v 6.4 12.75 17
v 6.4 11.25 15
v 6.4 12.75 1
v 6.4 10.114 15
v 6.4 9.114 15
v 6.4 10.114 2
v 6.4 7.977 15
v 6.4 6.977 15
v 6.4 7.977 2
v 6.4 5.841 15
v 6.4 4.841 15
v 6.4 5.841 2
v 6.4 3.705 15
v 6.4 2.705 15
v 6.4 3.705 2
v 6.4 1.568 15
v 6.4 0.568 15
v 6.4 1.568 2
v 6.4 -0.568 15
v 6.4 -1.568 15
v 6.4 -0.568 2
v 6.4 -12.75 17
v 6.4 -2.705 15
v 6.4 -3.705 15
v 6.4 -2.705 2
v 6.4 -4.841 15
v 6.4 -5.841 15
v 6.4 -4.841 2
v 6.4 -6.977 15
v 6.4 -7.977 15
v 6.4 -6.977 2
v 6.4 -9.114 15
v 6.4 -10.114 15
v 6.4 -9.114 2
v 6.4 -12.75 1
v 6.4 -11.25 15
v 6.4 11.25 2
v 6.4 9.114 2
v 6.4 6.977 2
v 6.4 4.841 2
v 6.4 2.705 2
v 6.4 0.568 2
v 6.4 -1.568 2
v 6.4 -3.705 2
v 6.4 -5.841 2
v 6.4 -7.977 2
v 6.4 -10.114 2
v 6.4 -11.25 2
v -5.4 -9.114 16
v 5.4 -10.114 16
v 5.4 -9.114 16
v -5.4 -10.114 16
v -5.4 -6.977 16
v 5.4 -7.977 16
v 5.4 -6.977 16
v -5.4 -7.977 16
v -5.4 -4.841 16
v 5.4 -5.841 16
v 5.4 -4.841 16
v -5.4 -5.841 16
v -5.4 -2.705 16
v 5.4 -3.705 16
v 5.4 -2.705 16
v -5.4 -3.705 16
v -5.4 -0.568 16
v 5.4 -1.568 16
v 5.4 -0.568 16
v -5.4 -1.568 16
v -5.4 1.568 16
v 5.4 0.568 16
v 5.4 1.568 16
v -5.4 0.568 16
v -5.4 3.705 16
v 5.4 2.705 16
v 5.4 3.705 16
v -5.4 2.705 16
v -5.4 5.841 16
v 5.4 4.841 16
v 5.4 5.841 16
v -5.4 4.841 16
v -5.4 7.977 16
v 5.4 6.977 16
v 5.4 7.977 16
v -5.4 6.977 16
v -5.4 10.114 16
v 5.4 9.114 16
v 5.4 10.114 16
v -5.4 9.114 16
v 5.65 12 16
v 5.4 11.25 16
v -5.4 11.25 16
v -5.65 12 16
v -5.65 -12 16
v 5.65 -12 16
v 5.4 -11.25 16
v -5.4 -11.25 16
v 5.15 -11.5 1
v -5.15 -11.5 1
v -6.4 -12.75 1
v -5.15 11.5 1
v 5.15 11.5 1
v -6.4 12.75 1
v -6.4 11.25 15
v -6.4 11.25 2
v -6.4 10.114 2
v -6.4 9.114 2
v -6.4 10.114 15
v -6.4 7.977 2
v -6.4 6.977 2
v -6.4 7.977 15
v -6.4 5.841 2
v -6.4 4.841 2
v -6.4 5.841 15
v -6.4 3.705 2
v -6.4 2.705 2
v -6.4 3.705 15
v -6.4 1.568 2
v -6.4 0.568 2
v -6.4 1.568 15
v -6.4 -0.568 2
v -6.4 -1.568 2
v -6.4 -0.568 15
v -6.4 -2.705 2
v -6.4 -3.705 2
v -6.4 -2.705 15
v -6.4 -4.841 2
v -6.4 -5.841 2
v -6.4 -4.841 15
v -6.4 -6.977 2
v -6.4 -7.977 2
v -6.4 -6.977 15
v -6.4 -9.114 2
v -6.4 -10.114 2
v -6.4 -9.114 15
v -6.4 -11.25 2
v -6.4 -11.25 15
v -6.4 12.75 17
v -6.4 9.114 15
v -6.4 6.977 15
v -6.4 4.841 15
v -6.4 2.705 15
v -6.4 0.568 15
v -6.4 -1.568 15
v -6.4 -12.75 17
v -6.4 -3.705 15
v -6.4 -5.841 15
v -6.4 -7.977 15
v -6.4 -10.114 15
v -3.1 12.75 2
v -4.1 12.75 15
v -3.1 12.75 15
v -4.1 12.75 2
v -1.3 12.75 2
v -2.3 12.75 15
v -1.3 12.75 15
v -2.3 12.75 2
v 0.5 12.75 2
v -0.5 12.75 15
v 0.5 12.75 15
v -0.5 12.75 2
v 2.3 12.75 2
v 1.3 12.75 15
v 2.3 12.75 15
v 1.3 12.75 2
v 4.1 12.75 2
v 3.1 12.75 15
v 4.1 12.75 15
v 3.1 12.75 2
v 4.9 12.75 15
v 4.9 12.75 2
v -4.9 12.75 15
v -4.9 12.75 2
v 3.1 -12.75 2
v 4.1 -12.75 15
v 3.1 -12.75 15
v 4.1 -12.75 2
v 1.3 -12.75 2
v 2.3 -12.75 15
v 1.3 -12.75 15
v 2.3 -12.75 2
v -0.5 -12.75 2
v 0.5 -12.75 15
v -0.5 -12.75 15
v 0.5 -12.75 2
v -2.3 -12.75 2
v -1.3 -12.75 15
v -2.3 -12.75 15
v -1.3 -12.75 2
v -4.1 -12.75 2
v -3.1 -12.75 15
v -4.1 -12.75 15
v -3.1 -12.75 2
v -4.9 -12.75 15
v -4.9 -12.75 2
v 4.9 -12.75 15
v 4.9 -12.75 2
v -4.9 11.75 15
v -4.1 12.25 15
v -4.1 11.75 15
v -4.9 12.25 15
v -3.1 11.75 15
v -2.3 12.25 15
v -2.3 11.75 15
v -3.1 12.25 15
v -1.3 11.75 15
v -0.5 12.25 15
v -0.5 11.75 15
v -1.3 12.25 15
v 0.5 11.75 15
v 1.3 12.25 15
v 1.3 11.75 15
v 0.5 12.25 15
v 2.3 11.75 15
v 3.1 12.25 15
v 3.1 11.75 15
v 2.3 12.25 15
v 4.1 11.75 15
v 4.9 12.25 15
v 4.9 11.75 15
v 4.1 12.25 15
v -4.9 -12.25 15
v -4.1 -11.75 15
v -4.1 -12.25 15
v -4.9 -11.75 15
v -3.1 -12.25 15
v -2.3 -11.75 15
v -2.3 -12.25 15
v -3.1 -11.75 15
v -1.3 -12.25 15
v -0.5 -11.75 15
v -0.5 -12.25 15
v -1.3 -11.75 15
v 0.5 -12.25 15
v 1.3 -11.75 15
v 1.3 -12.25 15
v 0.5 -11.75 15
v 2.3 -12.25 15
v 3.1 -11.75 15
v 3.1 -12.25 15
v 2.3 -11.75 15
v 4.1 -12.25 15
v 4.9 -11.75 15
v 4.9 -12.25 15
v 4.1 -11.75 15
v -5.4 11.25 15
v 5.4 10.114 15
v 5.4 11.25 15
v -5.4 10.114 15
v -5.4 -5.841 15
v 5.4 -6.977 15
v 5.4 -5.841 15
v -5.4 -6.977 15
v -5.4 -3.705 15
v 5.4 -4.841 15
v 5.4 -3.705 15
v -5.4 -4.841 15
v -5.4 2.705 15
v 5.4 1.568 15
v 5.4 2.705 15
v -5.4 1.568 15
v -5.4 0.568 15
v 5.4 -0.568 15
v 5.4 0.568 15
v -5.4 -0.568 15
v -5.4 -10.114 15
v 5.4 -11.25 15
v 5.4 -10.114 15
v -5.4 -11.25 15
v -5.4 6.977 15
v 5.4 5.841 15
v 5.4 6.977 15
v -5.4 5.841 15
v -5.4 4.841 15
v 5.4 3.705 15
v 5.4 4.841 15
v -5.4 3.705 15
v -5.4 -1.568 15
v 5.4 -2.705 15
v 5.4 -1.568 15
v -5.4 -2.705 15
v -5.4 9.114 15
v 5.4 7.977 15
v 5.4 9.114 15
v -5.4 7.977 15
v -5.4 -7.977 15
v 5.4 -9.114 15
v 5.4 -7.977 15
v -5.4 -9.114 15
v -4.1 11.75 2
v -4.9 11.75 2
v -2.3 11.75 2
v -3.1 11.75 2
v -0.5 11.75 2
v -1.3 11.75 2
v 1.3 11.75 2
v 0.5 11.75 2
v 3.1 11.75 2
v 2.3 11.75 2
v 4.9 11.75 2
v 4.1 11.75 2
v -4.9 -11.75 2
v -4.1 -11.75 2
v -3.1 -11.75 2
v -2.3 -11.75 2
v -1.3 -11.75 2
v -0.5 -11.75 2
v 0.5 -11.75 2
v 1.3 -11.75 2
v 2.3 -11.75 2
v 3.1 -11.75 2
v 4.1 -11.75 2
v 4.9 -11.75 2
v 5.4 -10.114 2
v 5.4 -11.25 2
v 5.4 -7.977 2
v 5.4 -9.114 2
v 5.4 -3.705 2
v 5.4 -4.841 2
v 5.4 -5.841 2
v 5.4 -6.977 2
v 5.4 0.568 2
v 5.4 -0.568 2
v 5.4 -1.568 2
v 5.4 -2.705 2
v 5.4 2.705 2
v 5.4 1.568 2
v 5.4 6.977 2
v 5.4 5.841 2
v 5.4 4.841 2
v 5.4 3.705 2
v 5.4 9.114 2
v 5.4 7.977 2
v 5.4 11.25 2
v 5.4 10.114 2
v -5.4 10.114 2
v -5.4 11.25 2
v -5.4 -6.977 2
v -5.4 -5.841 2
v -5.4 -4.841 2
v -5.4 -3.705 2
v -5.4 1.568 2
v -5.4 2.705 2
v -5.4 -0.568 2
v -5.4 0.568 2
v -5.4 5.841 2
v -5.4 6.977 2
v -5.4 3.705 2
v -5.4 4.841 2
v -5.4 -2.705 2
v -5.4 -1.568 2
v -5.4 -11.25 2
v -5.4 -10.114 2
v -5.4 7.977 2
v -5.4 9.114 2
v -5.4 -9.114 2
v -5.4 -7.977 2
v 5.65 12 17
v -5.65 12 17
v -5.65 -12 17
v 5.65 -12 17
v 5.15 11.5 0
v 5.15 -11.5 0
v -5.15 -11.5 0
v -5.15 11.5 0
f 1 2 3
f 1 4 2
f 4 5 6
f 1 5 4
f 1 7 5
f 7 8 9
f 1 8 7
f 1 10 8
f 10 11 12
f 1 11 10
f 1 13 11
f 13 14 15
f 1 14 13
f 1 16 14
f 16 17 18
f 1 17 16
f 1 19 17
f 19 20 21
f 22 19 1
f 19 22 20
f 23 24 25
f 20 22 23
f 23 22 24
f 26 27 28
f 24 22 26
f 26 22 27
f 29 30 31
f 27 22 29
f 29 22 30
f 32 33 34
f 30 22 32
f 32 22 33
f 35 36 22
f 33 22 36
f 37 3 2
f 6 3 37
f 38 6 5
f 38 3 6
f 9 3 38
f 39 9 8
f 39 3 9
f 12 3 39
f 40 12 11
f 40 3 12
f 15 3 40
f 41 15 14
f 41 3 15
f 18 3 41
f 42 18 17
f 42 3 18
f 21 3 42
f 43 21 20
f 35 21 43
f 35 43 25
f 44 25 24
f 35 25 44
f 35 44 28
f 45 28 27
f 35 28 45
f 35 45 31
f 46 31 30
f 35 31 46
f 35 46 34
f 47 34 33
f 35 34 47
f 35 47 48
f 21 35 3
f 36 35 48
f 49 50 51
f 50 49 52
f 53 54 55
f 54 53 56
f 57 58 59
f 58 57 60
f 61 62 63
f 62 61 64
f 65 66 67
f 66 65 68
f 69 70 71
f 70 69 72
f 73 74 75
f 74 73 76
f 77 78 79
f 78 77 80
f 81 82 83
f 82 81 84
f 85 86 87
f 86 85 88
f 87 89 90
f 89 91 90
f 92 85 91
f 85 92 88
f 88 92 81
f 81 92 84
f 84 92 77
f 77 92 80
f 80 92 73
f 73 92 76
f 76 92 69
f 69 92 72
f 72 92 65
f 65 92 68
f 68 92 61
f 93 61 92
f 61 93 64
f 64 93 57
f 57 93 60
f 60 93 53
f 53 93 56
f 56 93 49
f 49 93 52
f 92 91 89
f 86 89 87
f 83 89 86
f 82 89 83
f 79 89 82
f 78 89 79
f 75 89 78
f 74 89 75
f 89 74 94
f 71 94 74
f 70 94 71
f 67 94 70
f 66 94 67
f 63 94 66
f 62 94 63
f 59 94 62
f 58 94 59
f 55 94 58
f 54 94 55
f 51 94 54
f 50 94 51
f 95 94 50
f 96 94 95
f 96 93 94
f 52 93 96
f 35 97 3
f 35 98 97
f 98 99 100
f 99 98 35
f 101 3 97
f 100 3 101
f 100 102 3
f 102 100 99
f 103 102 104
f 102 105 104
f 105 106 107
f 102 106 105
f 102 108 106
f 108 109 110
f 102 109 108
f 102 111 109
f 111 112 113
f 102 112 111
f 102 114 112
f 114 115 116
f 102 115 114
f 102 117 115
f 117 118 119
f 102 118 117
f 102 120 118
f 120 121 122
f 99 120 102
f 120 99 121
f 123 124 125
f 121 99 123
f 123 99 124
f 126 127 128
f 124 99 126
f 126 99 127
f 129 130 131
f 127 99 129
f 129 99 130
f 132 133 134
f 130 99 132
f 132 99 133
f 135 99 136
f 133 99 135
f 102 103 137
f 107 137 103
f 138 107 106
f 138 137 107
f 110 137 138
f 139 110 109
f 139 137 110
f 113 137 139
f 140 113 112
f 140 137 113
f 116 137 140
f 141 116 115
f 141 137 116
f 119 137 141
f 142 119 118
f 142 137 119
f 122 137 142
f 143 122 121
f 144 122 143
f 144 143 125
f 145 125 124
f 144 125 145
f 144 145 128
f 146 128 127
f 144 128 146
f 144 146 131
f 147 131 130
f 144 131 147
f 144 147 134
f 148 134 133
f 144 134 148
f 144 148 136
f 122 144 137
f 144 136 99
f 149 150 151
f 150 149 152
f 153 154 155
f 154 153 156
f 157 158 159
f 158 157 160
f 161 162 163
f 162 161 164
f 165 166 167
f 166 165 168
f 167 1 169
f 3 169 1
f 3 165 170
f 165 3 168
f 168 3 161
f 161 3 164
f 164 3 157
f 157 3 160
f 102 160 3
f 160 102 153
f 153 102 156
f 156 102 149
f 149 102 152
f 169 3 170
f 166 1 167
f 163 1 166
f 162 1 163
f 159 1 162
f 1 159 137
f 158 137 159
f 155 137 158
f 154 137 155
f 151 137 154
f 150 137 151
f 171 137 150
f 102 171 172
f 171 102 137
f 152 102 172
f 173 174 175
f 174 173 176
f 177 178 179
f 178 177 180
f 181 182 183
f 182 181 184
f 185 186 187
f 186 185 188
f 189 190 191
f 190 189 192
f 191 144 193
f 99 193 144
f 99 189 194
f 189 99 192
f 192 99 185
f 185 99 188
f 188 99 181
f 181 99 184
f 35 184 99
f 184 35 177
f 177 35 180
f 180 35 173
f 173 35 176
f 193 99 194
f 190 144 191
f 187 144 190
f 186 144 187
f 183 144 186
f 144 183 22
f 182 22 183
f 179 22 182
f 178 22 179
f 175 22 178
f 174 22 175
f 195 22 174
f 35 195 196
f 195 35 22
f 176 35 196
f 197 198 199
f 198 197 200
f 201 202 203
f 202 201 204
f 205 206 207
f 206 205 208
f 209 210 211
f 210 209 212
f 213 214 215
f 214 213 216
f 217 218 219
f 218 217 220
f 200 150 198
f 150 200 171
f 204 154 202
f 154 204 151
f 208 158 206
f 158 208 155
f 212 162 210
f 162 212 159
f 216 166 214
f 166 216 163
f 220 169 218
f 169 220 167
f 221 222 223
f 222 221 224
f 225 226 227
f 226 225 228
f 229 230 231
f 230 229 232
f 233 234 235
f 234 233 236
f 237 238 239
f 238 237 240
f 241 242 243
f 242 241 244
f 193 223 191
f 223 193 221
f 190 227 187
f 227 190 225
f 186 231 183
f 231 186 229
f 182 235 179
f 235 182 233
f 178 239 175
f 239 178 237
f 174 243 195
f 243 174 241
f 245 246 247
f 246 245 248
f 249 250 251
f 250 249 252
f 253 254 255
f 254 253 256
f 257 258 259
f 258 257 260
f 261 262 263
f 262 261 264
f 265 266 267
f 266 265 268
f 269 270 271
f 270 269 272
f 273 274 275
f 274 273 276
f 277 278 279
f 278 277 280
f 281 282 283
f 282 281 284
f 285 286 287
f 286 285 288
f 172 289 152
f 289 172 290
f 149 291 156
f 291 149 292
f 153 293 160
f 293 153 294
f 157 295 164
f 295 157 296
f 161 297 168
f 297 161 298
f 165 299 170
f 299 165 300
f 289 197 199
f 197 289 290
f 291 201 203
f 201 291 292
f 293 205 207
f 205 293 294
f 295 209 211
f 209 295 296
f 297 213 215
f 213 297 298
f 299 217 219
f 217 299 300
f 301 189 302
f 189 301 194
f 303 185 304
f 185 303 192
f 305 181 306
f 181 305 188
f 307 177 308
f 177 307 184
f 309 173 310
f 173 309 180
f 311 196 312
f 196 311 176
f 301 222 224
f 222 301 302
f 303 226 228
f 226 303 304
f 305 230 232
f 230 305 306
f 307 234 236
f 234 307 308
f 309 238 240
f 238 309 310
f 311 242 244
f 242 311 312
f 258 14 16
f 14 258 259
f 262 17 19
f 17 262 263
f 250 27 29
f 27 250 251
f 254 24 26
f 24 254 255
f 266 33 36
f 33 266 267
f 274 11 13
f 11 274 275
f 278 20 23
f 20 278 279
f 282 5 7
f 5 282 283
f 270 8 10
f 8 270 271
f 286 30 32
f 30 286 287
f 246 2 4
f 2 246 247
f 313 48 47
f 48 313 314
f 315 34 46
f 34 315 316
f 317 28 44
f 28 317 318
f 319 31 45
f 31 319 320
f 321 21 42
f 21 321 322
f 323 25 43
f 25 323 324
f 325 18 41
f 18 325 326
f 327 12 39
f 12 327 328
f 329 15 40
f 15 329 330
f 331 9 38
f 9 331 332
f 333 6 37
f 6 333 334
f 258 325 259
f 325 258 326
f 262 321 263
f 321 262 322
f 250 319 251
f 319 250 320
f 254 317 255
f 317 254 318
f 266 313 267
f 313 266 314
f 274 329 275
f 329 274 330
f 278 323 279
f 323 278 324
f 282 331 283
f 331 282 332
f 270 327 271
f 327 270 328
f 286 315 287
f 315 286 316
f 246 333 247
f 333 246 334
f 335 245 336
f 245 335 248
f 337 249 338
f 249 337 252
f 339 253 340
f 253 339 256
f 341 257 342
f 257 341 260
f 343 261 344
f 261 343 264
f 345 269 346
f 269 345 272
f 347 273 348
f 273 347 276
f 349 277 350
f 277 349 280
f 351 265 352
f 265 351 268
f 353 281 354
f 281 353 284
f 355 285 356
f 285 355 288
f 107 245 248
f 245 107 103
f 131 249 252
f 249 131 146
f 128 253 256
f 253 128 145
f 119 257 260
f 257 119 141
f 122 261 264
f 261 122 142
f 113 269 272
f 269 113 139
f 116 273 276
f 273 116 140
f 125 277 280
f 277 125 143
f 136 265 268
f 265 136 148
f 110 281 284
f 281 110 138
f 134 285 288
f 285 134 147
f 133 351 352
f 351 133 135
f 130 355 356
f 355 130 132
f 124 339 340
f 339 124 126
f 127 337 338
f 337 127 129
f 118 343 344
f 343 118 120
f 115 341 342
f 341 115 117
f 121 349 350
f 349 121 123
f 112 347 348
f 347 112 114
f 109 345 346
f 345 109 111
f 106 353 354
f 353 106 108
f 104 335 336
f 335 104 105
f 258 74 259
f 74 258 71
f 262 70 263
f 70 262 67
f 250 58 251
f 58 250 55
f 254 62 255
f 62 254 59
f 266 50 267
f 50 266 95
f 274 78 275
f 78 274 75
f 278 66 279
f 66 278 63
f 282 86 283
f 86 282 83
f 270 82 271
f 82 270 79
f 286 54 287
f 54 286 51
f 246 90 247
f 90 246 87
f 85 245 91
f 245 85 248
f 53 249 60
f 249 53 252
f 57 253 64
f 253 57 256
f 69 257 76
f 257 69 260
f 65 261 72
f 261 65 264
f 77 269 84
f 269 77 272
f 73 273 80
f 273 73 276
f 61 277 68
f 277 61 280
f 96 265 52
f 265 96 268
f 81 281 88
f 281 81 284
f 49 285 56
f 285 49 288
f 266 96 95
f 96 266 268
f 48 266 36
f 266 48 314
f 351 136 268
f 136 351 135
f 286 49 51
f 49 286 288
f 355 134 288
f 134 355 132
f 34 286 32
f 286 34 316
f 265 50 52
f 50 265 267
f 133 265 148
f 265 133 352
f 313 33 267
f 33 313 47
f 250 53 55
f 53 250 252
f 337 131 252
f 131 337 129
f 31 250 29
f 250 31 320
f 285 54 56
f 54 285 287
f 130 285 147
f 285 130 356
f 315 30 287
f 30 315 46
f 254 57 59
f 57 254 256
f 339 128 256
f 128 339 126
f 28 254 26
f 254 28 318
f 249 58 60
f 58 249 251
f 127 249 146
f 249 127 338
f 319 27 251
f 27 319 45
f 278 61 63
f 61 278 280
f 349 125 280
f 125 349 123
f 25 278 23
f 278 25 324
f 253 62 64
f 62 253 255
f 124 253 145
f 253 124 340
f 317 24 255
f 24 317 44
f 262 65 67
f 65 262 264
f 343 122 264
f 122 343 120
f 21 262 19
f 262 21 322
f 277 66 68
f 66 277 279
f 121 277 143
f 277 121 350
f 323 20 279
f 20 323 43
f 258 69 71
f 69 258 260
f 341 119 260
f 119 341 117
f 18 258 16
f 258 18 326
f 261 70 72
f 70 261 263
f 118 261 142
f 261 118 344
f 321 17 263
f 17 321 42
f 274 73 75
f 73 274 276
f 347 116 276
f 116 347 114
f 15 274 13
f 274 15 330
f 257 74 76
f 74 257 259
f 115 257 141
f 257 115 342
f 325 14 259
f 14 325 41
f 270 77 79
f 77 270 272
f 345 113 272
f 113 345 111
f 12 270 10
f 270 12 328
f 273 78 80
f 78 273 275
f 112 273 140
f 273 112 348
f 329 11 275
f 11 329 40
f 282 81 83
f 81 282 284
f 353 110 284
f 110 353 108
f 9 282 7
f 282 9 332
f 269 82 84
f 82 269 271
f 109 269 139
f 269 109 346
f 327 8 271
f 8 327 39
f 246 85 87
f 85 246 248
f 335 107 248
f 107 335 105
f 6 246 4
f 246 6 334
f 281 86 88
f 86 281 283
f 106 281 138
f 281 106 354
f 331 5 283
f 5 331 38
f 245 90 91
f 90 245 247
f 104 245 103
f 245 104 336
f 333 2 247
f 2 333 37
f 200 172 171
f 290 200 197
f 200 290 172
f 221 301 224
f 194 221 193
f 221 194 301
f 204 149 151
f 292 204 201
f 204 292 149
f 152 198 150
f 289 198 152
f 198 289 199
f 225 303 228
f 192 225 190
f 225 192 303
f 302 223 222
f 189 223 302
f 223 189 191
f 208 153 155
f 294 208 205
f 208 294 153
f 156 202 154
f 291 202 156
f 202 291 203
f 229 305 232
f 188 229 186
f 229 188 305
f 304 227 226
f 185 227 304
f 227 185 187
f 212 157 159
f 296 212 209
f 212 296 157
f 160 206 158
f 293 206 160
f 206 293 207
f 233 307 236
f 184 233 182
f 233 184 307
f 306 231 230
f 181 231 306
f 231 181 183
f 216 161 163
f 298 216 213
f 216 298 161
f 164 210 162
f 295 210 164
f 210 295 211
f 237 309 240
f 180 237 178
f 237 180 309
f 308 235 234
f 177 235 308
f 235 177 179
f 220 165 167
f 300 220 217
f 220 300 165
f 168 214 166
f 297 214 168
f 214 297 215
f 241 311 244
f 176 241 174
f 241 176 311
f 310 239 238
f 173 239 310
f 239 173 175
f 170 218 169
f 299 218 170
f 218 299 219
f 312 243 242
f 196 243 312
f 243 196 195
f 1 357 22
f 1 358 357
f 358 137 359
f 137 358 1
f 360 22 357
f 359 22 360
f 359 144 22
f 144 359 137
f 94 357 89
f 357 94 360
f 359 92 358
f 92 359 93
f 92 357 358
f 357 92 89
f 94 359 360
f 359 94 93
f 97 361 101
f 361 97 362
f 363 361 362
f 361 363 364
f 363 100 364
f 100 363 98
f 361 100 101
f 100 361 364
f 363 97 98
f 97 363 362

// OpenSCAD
// ==========================================================
// Wavy Shipping Container Model
// Base: 26 x 13.5 mm, Height: 15 mm
// Flat bottom for 3D printing, wavy (corrugated) side walls
// ==========================================================

// ---- Parameters ----
length      = 25.5;
width       = 12.8;
height      = 15;
wall_margin = 1;
wall_indent = 1;
stack_indent = 1;
stack_tolerance = 0.5;


length_bars = 11;
width_bars = 6;


$fn = 100;

module cube_on_z0 (width, length, height) {
    translate(v = [0,0,height/2]) {
        cube([width
             ,length
             ,height]
            ,center=true);
    }
}

union() {
    translate([0,0,stack_indent]){
        difference() {
            cube_on_z0(width, length, height);

            translate([0,length/2,wall_margin]){
                cube_on_z0(width-2*wall_margin, 2*wall_indent, height-2*wall_margin);
            }
            translate([0,-length/2,wall_margin]){
                cube_on_z0(width-2*wall_margin, 2*wall_indent, height-2*wall_margin);
            }
            translate([width/2,0,wall_margin]){
                cube_on_z0(2*wall_indent, length-2*wall_margin, height-2*wall_margin);
            }
            translate([-width/2,0,wall_margin]){
                cube_on_z0(2*wall_indent, length-2*wall_margin, height-2*wall_margin);
            }
            translate([0,0,height-wall_indent]){
                cube_on_z0(width-2*wall_margin, length-2*wall_margin, 2*wall_indent);
            }
        }
        for (i=[0:length_bars]) {
            translate([width/2 - wall_indent/2, -length/2 + wall_margin + (length-2*wall_margin)*i/length_bars,0]) {
                cube_on_z0(wall_indent, wall_indent, height);
            }
            translate([-width/2 + wall_indent/2, -length/2 + wall_margin + (length-2*wall_margin)*i/length_bars,0]) {
                cube_on_z0(wall_indent, wall_indent, height);
            }
            translate([0, -length/2 + wall_margin + (length-2*wall_margin)*i/length_bars, height-wall_indent]) {
                cube_on_z0(width, wall_indent, wall_indent);
            }
        }
        for (i=[0:width_bars]) {
            translate([-width/2 + wall_margin + (width-2*wall_margin)*i/width_bars, length/2 - wall_indent/2 ,0]) {
                cube_on_z0(wall_indent, wall_indent, height);
            }
            translate([-width/2 + wall_margin + (width-2*wall_margin)*i/width_bars, -length/2 + wall_indent/2 ,0]) {
                cube_on_z0(wall_indent, wall_indent, height);
            }
        }
    }
    cube_on_z0(width - 2*stack_indent - stack_tolerance, length - 2*stack_indent - stack_tolerance, stack_indent);
    translate([0,0,stack_indent+height]){
        difference() {
            cube_on_z0(width, length, stack_indent);
            cube_on_z0(width - 2*stack_indent + stack_tolerance, length - 2*stack_indent + stack_tolerance, stack_indent);
        }
    }
}
